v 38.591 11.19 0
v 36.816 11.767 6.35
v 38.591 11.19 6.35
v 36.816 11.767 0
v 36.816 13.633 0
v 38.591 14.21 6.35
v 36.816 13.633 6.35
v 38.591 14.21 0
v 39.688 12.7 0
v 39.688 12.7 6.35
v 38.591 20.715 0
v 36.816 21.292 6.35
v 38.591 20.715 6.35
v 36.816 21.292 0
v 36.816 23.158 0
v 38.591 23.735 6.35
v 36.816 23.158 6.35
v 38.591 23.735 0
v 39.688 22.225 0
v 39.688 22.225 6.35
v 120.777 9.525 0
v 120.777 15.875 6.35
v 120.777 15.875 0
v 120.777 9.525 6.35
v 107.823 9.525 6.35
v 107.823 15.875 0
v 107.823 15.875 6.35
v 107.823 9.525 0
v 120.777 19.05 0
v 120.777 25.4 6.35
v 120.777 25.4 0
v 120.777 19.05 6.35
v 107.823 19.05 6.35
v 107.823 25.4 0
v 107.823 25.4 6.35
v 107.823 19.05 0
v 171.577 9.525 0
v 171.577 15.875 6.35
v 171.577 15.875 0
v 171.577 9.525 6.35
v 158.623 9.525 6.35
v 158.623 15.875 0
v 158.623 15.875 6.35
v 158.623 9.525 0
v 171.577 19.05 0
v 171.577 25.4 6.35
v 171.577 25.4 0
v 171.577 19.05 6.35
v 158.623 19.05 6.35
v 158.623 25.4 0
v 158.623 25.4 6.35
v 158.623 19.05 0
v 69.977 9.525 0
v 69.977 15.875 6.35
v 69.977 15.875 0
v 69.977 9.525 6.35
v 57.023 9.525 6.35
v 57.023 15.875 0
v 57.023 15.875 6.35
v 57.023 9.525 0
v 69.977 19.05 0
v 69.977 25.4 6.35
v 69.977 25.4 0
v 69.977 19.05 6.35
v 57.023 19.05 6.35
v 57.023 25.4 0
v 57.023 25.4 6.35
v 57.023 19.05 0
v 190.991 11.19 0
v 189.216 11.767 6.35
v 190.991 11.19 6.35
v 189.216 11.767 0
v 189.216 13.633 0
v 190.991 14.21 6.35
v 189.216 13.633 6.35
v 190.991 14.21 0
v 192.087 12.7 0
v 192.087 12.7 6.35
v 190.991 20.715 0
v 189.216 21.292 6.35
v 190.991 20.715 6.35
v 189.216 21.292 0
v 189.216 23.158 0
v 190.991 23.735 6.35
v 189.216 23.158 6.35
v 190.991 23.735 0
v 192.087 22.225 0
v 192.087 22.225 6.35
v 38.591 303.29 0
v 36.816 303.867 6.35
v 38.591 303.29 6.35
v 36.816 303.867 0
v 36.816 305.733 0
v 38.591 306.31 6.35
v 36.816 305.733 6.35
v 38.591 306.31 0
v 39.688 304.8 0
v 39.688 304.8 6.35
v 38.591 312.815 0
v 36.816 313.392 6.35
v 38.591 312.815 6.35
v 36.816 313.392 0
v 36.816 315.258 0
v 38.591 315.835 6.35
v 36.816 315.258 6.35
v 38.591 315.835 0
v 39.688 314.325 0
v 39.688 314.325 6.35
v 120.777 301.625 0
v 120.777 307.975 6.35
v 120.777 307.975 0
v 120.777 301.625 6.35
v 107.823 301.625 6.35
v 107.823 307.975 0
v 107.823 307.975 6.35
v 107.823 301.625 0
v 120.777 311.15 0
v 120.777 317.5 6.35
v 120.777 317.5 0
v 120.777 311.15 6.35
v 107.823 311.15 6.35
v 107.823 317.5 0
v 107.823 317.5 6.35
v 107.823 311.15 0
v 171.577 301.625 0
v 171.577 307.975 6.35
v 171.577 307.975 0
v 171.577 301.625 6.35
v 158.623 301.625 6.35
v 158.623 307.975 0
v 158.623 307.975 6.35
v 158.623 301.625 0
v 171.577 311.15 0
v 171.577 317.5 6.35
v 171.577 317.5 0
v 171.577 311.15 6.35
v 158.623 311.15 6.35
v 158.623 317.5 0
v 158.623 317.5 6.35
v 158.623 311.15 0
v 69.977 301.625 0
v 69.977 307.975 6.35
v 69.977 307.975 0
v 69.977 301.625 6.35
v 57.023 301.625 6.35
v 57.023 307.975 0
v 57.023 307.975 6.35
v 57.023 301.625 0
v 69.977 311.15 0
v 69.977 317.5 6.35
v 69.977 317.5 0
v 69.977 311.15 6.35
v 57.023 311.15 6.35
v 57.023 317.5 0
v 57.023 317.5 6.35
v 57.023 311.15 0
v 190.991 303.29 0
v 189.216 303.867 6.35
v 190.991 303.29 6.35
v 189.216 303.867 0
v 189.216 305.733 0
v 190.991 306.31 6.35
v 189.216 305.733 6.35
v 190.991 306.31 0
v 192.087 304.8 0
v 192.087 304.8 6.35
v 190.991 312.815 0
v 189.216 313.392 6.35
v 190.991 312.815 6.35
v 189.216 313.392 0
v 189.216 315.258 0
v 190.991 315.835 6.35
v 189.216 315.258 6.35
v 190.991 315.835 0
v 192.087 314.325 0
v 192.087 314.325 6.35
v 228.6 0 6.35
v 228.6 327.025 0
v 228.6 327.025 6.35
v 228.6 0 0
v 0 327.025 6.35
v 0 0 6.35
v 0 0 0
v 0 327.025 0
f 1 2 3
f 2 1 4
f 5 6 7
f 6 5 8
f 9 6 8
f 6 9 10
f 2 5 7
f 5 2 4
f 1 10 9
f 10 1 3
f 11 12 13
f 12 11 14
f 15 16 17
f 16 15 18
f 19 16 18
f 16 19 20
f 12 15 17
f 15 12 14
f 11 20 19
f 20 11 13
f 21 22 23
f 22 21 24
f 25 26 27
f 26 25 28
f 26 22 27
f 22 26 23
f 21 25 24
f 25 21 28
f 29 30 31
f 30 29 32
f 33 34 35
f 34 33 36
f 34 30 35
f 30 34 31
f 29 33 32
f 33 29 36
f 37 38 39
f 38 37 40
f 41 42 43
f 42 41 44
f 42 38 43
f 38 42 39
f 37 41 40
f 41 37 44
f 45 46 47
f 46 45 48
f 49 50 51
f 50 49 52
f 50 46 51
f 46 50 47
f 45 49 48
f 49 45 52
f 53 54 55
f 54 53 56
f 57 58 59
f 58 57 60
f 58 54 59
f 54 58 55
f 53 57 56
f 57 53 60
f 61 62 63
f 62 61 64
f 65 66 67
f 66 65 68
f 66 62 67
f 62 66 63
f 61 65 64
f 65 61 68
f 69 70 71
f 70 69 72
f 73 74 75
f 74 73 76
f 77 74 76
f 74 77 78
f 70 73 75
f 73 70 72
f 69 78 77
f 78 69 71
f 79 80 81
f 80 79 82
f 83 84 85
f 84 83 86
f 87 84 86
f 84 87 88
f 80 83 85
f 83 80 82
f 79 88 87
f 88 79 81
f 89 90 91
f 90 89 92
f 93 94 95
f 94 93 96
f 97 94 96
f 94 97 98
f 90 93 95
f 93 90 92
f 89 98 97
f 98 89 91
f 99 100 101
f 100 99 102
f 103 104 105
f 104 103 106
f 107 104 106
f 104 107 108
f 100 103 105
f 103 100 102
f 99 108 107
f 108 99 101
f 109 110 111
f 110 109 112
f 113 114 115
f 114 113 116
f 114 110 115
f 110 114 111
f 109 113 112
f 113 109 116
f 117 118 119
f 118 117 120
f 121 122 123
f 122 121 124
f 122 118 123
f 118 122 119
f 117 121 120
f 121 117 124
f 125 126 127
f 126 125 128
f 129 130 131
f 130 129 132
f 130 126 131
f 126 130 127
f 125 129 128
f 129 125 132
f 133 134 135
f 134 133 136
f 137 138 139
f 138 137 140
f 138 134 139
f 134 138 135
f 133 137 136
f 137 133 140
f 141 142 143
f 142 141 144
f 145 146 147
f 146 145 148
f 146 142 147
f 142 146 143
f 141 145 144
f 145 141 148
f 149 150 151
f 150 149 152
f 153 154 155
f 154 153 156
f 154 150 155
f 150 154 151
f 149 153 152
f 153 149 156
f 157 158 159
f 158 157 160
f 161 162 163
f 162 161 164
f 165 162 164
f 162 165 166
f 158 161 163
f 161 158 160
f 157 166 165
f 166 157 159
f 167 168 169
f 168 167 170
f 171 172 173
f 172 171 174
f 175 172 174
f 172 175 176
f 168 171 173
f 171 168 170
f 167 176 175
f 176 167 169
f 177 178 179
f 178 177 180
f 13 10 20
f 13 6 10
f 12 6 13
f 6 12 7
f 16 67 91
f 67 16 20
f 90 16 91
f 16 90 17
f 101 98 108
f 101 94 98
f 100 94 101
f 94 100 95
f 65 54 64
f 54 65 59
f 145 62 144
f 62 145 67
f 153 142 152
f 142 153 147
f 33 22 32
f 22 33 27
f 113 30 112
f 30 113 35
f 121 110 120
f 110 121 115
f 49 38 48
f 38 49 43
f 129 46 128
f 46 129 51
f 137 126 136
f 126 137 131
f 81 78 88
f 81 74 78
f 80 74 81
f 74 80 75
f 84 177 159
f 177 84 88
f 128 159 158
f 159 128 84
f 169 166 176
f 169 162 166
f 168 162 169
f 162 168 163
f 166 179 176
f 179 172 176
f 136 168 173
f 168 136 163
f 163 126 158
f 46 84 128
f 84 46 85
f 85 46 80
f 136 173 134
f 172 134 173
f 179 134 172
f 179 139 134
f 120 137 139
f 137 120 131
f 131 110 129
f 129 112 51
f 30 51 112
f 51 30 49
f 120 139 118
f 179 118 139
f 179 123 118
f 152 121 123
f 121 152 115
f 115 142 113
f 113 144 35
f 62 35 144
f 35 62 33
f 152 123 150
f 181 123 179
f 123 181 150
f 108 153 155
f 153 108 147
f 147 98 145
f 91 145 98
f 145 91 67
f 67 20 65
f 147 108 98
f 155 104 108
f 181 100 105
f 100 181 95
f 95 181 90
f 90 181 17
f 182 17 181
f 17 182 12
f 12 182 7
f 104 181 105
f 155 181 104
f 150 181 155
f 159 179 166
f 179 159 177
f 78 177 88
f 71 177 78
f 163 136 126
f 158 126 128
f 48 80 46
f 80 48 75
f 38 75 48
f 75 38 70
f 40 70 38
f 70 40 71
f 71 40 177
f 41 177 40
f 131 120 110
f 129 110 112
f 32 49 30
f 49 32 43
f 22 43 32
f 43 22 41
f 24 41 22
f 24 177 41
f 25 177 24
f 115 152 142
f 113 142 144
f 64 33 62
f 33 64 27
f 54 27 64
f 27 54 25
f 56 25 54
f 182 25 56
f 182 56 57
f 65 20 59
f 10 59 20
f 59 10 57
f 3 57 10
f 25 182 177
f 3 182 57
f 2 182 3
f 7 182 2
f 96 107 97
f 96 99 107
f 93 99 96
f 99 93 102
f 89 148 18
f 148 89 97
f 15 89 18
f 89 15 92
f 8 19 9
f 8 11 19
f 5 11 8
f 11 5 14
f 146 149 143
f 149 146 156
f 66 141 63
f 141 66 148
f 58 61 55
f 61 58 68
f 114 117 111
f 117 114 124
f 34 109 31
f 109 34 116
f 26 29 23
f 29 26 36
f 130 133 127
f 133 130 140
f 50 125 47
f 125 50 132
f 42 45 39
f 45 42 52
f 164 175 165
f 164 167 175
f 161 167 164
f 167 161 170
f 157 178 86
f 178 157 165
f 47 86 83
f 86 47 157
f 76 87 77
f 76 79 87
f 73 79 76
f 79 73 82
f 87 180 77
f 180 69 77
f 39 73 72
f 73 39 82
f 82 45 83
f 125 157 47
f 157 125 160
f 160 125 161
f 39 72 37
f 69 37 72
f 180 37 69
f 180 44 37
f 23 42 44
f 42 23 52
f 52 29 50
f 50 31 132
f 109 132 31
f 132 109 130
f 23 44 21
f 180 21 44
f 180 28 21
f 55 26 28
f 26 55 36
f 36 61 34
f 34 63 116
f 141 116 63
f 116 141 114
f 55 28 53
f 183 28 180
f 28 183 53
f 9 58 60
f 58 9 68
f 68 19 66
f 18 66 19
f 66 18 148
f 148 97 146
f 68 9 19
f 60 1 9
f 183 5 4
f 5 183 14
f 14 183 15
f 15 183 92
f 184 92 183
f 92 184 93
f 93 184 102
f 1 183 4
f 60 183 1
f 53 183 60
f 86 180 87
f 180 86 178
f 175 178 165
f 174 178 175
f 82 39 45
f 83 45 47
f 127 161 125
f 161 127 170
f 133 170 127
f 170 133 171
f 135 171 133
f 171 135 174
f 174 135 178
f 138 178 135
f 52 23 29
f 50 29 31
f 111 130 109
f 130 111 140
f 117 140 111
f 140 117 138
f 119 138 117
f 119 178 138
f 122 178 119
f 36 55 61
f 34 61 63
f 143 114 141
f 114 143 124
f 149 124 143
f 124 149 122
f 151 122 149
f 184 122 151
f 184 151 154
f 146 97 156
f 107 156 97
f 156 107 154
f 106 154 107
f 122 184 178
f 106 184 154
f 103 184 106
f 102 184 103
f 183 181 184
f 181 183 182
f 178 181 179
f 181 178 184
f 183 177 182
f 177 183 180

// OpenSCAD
function mm(i) = i*25.4; 
    rolldiam = mm(8); //diameter of the roll of paper
	 rollheight = mm(11); //height of a roll of paper
	 thickness= mm(.25); // thickness of material
	 boltwidth = mm(1/8); // desired diameter of bolt holes
	 dist = mm(.375); // distance the supports are seperated



module boltholes(thickness=mm(.25),boltwidth=mm(1/8), dist=mm(.375))
	{
	translate([0,0,-1])
				{
					cylinder(thickness+2, boltwidth/2, boltwidth/2, 0);
				}
	translate([0,dist,-1])
				{
					cylinder(thickness+2, boltwidth/2, boltwidth/2, 0);
				}
	}

module slotholes(thickness=mm(.25), dist=mm(.375))
	{
	translate([-mm(.51)/2, mm(.5)/2+thickness/2,-1])
	{
	cube ([mm(.51), thickness, thickness+2]);
	}
	translate([-mm(.51)/2, mm(.5)+thickness,-1])
	{
	cube ([mm(.51), thickness, thickness+2]);
	}
	}

module base(thickness = mm(.25), rolldiam=mm(8), boltwidth=mm(1/8),dist = mm(.375))
	{
		difference()
			{
				cube([rolldiam+mm(1), rollheight+mm(1.5)+dist, thickness]);
				translate([0,0,0])
				{
					union()
						{	
					translate([mm(1.5),mm(.5),0])
					{
						boltholes();
					}
					translate([rolldiam/2+mm(1/2),0,0])
					{
						slotholes();
					}
					translate([rolldiam/2+rolldiam/4+mm(1/2),0,0])
					{
						slotholes();
					}
					translate([rolldiam/4+mm(1/2),0,0])
					{
						slotholes();
					}					
					translate([rolldiam-mm(.5),mm(.5),0])
					{
						boltholes();
					}
					translate([mm(1.5),rollheight+mm(1),0])
					{
						boltholes();
					}
					translate([rolldiam/2+mm(1/2),rollheight+mm(.5),0])
					{
						slotholes();
					}
					translate([rolldiam/2+rolldiam/4+mm(1/2),rollheight+mm(.5),0])
					{
						slotholes();
					}
					translate([rolldiam/4+mm(1/2),rollheight+mm(.5),0])
					{
						slotholes();
					}
					translate([rolldiam-mm(.5),rollheight+mm(1),0])
					{
						boltholes();
					}
					
				}
			}
	}
}

base();
